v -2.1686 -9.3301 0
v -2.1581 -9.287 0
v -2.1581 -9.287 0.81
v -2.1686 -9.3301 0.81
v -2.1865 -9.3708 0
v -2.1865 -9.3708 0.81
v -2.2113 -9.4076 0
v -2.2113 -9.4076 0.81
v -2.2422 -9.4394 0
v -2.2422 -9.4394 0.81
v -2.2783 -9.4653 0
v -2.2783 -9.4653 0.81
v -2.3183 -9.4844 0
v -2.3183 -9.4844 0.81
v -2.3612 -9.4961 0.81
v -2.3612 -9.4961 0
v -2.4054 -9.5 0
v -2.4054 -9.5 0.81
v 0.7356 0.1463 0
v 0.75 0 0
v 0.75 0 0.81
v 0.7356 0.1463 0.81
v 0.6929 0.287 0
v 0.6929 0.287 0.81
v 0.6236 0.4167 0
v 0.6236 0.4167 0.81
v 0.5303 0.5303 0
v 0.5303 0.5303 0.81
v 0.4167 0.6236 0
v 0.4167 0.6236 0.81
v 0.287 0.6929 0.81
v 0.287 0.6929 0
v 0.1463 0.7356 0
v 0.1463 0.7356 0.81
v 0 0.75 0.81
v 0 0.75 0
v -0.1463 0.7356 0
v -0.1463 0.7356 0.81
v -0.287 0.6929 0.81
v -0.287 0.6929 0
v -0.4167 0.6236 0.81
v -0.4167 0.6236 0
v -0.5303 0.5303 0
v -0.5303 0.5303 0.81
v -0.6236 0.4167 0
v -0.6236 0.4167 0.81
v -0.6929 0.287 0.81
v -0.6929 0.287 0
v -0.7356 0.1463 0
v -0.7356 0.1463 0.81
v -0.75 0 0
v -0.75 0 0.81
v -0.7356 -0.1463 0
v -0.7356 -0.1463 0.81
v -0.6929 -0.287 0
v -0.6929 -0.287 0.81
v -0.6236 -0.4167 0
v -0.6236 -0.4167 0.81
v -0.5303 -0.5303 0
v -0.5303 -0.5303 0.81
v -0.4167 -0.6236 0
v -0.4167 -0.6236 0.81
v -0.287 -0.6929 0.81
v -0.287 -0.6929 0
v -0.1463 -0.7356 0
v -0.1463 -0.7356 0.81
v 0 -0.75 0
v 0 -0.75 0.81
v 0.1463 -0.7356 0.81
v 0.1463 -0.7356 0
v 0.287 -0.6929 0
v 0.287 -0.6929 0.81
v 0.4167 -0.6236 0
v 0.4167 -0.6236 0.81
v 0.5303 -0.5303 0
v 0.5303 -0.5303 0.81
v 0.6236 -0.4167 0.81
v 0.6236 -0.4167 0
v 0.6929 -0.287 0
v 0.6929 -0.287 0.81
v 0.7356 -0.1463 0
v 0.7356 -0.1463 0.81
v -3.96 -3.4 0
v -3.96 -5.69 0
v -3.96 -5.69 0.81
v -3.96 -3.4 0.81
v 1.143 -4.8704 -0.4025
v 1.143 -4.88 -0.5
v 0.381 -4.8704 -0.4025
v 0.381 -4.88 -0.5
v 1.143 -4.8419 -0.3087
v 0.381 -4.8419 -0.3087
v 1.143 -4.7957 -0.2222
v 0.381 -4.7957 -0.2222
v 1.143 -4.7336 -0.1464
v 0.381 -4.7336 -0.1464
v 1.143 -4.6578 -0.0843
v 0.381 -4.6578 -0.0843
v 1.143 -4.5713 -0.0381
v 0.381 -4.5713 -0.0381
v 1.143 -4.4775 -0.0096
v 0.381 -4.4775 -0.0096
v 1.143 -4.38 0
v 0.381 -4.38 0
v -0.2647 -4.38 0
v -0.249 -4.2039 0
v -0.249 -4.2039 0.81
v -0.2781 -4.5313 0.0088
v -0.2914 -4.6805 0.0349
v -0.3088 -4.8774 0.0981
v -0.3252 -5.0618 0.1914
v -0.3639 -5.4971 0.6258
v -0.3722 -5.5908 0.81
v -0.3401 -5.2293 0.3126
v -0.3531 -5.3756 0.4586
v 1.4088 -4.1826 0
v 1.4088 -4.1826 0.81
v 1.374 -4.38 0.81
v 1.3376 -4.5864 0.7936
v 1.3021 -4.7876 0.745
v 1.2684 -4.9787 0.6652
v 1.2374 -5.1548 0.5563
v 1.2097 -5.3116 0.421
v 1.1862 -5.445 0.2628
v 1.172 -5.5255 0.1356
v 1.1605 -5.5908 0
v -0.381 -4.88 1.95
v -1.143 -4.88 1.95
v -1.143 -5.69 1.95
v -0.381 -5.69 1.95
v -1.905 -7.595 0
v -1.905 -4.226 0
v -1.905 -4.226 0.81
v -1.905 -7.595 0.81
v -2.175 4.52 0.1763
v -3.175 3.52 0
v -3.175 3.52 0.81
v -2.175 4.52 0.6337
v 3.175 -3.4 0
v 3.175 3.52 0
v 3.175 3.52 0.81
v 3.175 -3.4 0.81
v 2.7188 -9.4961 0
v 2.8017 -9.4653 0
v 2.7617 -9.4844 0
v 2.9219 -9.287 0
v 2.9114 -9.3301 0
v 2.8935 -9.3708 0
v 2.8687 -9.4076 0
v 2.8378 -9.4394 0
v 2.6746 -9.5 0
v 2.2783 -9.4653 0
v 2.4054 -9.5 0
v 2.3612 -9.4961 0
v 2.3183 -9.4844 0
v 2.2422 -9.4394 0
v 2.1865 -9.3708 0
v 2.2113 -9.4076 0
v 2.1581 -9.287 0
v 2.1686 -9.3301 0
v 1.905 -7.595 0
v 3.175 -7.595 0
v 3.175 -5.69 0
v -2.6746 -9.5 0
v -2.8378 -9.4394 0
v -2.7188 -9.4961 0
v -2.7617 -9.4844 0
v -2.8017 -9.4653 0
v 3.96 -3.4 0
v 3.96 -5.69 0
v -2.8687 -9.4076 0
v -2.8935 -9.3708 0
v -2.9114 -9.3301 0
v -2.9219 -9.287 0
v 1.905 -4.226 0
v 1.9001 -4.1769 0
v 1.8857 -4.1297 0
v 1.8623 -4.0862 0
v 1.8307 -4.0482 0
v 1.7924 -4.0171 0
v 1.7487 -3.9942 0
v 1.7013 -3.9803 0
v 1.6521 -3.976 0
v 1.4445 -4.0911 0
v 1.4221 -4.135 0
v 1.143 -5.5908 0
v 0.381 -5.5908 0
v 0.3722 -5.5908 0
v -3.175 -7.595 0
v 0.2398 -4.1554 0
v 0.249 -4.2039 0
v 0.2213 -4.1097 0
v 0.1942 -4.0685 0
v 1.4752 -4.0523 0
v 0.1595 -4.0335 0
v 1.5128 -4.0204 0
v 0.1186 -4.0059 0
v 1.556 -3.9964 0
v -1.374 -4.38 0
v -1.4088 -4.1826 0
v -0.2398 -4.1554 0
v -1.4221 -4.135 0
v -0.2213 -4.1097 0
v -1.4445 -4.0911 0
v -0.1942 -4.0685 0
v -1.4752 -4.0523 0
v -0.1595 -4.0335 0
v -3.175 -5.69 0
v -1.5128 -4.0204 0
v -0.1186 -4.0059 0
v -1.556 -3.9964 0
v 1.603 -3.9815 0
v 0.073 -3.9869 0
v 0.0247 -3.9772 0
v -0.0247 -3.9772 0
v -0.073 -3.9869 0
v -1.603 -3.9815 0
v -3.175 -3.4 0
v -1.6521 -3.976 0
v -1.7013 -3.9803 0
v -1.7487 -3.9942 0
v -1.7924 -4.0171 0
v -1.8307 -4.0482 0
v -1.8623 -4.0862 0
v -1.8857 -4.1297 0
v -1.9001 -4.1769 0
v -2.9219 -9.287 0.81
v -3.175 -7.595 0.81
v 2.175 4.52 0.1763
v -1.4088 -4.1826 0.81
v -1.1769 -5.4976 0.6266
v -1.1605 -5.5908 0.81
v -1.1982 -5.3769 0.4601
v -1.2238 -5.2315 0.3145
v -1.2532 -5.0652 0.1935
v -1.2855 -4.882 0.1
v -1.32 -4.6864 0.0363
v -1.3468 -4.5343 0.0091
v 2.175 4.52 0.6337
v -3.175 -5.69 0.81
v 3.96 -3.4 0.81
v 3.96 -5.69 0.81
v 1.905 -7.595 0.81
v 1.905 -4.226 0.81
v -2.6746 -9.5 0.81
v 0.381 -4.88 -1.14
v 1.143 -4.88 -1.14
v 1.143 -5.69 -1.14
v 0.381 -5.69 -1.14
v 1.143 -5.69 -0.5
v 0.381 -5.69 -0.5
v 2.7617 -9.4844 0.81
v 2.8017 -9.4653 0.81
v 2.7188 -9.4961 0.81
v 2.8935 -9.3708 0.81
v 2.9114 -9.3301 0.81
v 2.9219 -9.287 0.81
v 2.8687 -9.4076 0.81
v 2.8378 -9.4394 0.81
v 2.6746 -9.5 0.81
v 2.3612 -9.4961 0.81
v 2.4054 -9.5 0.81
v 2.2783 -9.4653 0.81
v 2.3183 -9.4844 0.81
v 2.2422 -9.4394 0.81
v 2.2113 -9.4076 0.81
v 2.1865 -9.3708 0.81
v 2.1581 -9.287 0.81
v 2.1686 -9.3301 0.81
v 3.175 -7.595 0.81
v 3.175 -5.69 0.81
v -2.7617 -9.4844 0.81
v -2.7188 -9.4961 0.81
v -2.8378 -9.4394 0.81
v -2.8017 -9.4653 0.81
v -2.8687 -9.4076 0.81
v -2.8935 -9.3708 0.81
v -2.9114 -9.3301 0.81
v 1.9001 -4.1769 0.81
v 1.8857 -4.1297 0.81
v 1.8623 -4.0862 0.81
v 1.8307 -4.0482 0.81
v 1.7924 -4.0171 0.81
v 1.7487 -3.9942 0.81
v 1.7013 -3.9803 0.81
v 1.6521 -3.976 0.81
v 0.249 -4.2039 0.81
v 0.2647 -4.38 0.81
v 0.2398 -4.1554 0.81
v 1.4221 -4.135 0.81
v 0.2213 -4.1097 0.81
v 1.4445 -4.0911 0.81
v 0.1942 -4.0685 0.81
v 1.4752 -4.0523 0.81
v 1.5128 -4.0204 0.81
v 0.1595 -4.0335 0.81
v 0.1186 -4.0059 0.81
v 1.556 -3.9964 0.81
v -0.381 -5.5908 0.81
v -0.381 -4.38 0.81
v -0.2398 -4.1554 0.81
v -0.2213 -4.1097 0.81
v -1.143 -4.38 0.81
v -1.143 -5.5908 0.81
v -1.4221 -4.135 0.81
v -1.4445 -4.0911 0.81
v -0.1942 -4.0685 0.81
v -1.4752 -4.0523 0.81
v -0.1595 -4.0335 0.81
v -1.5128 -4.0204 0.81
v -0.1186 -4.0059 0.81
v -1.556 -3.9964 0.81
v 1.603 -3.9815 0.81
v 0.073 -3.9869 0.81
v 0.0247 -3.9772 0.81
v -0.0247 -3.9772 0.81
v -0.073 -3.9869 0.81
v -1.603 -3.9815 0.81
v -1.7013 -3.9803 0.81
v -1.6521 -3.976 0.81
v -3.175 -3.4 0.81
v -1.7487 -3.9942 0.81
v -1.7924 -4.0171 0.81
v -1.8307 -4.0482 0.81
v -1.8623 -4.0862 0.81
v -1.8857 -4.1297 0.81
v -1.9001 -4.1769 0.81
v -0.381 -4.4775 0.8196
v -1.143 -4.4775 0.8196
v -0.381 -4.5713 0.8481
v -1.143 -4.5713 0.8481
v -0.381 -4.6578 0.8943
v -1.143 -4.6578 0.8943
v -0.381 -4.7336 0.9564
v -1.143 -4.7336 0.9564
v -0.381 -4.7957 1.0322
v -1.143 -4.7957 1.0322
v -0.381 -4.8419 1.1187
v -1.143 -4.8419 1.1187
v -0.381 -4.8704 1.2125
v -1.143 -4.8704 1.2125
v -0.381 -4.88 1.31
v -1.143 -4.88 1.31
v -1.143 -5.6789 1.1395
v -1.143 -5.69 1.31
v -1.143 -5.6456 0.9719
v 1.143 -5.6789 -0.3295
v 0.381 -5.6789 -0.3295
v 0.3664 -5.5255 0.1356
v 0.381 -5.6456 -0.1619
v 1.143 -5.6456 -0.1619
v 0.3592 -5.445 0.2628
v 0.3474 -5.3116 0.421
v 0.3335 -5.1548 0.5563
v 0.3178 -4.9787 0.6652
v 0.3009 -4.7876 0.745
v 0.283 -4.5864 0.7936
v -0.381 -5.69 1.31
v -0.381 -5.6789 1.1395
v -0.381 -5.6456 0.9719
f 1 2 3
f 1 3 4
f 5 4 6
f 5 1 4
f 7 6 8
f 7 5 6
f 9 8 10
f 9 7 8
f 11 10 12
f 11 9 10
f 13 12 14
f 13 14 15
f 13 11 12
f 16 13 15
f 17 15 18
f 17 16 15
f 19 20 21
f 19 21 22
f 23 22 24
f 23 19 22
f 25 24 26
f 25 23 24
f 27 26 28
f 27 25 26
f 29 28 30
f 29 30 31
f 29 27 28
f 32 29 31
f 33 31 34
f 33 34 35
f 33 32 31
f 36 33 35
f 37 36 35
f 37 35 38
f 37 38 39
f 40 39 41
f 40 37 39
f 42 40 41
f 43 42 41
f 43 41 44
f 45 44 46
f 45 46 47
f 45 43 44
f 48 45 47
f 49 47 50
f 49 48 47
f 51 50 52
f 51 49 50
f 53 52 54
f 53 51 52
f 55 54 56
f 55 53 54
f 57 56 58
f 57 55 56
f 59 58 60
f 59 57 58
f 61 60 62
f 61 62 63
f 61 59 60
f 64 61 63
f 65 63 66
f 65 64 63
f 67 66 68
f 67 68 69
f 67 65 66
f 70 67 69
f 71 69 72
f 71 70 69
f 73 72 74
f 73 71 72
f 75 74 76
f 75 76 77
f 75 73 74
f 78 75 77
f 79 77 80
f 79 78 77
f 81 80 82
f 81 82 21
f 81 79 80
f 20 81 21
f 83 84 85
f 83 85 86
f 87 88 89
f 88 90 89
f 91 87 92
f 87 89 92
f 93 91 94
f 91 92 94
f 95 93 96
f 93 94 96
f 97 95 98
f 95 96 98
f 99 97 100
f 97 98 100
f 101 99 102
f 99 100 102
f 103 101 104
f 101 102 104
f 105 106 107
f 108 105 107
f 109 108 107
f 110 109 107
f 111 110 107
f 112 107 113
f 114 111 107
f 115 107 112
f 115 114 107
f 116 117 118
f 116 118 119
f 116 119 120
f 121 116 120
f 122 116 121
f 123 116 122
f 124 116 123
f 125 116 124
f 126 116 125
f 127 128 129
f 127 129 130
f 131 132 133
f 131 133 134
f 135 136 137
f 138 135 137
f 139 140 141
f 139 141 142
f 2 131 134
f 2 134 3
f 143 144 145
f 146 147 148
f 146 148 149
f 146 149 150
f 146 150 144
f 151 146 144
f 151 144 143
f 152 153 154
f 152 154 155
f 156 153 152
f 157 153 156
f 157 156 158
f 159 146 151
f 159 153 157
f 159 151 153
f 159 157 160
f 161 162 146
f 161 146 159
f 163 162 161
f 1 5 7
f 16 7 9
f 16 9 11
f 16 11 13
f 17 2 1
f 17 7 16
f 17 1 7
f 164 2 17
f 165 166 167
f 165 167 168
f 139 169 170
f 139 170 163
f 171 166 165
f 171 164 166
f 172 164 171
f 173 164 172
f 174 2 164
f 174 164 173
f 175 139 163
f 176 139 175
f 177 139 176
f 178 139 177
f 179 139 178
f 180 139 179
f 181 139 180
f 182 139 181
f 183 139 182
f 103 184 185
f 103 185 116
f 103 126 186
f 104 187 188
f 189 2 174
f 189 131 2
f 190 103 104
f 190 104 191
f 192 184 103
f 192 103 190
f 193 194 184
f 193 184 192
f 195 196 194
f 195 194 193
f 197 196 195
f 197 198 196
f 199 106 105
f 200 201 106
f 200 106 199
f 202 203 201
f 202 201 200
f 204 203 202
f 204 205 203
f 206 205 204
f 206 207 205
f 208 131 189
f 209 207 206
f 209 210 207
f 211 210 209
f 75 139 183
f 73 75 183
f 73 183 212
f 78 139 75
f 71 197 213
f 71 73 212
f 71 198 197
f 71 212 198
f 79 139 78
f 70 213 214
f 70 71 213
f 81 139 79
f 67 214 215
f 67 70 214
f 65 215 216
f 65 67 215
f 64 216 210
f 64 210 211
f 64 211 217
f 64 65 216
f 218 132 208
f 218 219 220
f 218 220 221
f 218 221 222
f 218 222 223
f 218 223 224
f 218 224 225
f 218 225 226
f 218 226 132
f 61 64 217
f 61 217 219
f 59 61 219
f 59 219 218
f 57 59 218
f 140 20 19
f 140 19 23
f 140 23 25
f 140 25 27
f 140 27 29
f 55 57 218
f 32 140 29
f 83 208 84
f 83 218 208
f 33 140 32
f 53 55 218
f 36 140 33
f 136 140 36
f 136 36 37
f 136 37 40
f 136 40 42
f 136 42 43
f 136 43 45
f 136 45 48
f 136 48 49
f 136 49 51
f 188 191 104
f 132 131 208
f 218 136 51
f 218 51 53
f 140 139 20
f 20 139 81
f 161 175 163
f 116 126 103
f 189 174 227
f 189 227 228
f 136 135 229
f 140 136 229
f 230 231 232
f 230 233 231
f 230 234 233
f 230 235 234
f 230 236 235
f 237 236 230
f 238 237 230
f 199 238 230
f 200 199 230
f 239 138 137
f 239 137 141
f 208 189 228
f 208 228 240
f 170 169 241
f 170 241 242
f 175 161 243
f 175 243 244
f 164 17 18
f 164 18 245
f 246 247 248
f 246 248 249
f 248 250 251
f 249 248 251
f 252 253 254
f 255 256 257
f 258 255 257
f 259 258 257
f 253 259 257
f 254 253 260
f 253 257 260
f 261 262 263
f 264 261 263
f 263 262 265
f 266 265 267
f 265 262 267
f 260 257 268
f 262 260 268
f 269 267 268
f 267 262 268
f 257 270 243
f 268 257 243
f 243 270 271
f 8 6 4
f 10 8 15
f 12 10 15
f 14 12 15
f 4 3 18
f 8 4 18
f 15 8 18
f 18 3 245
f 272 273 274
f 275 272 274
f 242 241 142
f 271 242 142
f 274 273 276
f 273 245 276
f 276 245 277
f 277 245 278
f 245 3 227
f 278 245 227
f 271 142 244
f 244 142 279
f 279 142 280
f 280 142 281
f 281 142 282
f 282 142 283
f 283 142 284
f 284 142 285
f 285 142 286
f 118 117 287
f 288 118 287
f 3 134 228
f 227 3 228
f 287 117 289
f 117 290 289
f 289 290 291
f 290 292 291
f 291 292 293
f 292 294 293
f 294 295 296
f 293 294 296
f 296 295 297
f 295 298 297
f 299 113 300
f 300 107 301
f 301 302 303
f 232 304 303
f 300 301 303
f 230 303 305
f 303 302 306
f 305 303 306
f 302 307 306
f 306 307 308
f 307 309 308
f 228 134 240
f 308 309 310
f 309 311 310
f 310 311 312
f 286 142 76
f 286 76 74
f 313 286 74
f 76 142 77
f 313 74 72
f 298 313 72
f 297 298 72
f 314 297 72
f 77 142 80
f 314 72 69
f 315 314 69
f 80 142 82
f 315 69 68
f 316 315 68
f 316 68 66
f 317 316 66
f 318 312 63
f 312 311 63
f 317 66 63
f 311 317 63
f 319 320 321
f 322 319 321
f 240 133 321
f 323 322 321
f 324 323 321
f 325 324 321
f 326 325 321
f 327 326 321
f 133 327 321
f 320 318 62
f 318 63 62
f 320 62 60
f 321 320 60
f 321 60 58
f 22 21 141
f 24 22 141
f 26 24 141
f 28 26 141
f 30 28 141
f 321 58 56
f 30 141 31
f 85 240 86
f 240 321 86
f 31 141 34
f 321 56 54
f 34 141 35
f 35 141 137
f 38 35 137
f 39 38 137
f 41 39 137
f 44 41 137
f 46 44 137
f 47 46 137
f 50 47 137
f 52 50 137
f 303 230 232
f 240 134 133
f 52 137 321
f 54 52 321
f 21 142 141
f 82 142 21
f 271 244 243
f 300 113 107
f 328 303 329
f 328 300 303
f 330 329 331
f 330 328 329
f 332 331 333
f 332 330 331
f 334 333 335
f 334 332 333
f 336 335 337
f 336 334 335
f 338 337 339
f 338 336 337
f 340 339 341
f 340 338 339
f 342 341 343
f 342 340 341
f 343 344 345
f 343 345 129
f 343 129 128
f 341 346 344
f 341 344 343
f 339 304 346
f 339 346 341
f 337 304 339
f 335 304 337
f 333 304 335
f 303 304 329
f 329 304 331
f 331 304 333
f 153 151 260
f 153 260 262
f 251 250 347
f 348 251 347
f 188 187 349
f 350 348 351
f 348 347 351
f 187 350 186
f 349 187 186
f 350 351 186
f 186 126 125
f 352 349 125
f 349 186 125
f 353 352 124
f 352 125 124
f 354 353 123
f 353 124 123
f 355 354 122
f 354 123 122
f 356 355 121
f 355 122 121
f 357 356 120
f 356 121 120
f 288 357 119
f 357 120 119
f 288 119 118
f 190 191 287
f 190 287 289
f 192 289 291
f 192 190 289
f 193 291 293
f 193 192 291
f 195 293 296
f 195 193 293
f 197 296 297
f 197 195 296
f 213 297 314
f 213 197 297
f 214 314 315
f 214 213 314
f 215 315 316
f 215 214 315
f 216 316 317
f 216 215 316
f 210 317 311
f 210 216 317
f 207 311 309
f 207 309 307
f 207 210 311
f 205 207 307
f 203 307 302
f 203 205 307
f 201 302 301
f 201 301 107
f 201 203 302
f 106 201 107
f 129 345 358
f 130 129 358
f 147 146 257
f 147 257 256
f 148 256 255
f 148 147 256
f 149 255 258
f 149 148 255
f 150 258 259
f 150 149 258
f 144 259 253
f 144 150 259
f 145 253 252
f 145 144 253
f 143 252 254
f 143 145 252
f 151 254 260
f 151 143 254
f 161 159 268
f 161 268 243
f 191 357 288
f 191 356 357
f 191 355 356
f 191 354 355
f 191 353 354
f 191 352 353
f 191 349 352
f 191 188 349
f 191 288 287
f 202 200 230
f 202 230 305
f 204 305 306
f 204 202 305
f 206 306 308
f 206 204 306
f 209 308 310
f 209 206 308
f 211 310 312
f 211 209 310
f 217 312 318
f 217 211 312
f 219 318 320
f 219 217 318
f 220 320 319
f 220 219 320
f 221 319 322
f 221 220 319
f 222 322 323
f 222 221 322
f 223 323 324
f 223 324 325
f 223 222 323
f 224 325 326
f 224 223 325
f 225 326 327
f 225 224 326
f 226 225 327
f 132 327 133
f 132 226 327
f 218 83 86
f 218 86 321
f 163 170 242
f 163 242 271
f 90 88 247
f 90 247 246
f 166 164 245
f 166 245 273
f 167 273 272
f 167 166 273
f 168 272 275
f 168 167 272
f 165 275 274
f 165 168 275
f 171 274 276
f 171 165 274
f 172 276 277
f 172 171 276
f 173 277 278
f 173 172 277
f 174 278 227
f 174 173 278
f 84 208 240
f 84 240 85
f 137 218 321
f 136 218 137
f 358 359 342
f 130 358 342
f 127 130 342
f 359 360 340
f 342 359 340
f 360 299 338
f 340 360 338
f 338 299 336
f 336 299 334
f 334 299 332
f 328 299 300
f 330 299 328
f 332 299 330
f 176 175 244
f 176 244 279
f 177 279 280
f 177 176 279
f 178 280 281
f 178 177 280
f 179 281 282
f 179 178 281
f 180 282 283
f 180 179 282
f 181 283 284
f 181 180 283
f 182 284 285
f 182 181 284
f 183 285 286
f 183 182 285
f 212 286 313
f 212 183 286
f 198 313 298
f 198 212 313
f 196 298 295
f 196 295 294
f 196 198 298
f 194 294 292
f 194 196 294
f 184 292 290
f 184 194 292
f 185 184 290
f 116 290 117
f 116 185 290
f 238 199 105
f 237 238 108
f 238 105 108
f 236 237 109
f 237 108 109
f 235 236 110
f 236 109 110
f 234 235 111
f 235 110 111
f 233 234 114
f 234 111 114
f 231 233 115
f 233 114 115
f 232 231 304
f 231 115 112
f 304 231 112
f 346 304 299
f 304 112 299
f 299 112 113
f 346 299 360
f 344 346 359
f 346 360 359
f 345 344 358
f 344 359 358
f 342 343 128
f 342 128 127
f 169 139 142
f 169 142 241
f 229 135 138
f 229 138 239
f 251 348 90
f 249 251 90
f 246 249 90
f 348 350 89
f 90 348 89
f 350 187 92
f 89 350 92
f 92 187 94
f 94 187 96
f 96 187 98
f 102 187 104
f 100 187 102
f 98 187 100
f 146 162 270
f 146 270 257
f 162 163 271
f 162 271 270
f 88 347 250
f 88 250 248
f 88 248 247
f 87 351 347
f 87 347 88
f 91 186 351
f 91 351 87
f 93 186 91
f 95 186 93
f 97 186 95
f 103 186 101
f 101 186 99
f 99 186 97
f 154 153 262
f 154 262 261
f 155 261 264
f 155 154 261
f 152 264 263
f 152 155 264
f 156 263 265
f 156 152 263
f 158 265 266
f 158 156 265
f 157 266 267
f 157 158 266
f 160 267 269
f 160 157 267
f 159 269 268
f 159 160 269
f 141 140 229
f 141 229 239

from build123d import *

# Parameters (mm, degrees)
SKETCH1_R      = 0.75
EXTRUDE1_DEPTH = 0.81
CHAMFER4_SIZE  = 1
CHAMFER4_SIZE2 = 0.176326981
CHAMFER5_SIZE  = 1
CHAMFER5_SIZE2 = 0.176326981
CHAMFER1_SIZE  = 1
SKETCH2_W      = 0.762
SKETCH2_H      = 0.81
EXTRUDE2_DEPTH = 1.14
SKETCH3_W      = 0.762
SKETCH3_H      = 0.81
EXTRUDE3_DEPTH = 1.14
FILLET1_R      = 0.5
FILLET2_R      = 1.31


with BuildPart() as part:
    # Sketch1 → Extrude1 (new body)
    with BuildSketch(Plane.XY):
        with BuildLine():
            Line((-3.175, 4.52), (3.175, 4.52))
            Line((3.175, 4.52), (3.175, -3.4))
            Line((3.175, -3.4), (3.96, -3.4))
            Line((3.96, -3.4), (3.96, -5.69))
            Line((3.96, -5.69), (3.175, -5.69))
            Line((3.175, -5.69), (3.175, -7.595))
            Line((3.175, -7.595), (2.921867651, -9.286989911))
            ThreePointArc((2.921867651, -9.286989911), (2.837794855, -9.43940364), (2.674619301, -9.5))
            Line((2.674619301, -9.5), (2.405380699, -9.5))
            ThreePointArc((2.405380699, -9.5), (2.242205145, -9.43940364), (2.158132349, -9.286989911))
            Line((2.158132349, -9.286989911), (1.905, -7.595))
            Line((1.905, -7.595), (1.905, -4.225996329))
            ThreePointArc((1.905, -4.225996329), (1.676788936, -3.976947655), (1.408798062, -4.182584285))
            Line((1.408798062, -4.182584285), (1.143, -5.69))
            Line((1.143, -5.69), (0.381, -5.69))
            Line((0.381, -5.69), (0.249019923, -4.203881227))
            ThreePointArc((0.249019923, -4.203881227), (0, -3.975996329), (-0.249019923, -4.203881227))
            Line((-0.249019923, -4.203881227), (-0.381, -5.69))
            Line((-0.381, -5.69), (-1.143, -5.69))
            Line((-1.143, -5.69), (-1.408798062, -4.182584285))
            ThreePointArc((-1.408798062, -4.182584285), (-1.676788936, -3.976947655), (-1.905, -4.225996329))
            Line((-1.905, -4.225996329), (-1.905, -7.595))
            Line((-1.905, -7.595), (-2.158132349, -9.286989911))
            ThreePointArc((-2.158132349, -9.286989911), (-2.242205145, -9.43940364), (-2.405380699, -9.5))
            Line((-2.405380699, -9.5), (-2.674619301, -9.5))
            ThreePointArc((-2.674619301, -9.5), (-2.837794855, -9.43940364), (-2.921867651, -9.286989911))
            Line((-2.921867651, -9.286989911), (-3.175, -7.595))
            Line((-3.175, -7.595), (-3.175, -5.69))
            Line((-3.175, -5.69), (-3.96, -5.69))
            Line((-3.96, -5.69), (-3.96, -3.4))
            Line((-3.96, -3.4), (-3.175, -3.4))
            Line((-3.175, -3.4), (-3.175, 4.52))
        make_face()
        Circle(SKETCH1_R, mode=Mode.SUBTRACT)
    extrude(amount=EXTRUDE1_DEPTH)

    # Chamfer4
    chamfer4_edges = [part.edges().sort_by_distance(p)[0] for p in [
        (0, 4.52, 0.81),
    ]]
    chamfer4_side = [part.faces().sort_by_distance(p)[0] for p in [
        (0, -1.422995991, 0.81),
    ]]
    chamfer(chamfer4_edges, length=CHAMFER4_SIZE, length2=CHAMFER4_SIZE2, reference=chamfer4_side[0])

    # Chamfer5
    chamfer5_edges = [part.edges().sort_by_distance(p)[0] for p in [
        (0, 4.52, 0),
    ]]
    chamfer5_side = [part.faces().sort_by_distance(p)[0] for p in [
        (0, -1.422995991, 0),
    ]]
    chamfer(chamfer5_edges, length=CHAMFER5_SIZE, length2=CHAMFER5_SIZE2, reference=chamfer5_side[0])

    # Chamfer1
    chamfer1_edges = [part.edges().sort_by_distance(p)[0] for p in [
        (-3.175, 4.52, 0.405),
        (3.175, 4.52, 0.405),
    ]]
    chamfer(chamfer1_edges, length=CHAMFER1_SIZE)

    # Sketch2 → Extrude2 (add)
    with BuildSketch(Plane.XY.offset(0.81)):
        with Locations((-0.762, -5.285)):
            Rectangle(SKETCH2_W, SKETCH2_H)
    extrude(amount=EXTRUDE2_DEPTH)

    # Sketch3 → Extrude3 (add)
    with BuildSketch(Plane(origin=(0, 0, 0), x_dir=(-1, 0, 0), z_dir=(0, 0, -1))):
        with Locations((-0.762, -5.285)):
            Rectangle(SKETCH3_W, SKETCH3_H)
    extrude(amount=EXTRUDE3_DEPTH)

    # Fillet1
    fillet1_edges = [part.edges().sort_by_distance(p)[0] for p in [
        (-0.762, -4.88, 0.81),
        (0.762, -4.88, 0),
    ]]
    fillet(fillet1_edges, radius=FILLET1_R)

    # Fillet2
    # the kernel refuses this fillet: 1.31 mm, written as the material it takes off along each edge
    with BuildSketch(Plane(origin=(2.894, -5.69, 0), x_dir=(0, 1, 0), z_dir=(-1, 0, 0))) as fillet2_piece_1_section:
        with BuildLine():
            CenterArc((FILLET2_R, -FILLET2_R), FILLET2_R, 90, 90)
            Line((0, -FILLET2_R), (0, 0))
            Line((0, 0), (FILLET2_R, 0))
        make_face()
    fillet2_piece_1 = extrude(amount=7.312, mode=Mode.PRIVATE)
    fillet2_piece_1 = split(fillet2_piece_1, bisect_by=Plane(origin=(-1.183630383, -5.45957365, 0.262964563), z_dir=(0.984807753012208, 0.17364817766693083, 0)), keep=Keep.TOP, mode=Mode.PRIVATE)
    fillet2_piece_1 = split(fillet2_piece_1, bisect_by=Plane(origin=(0.345201257, -5.286899882, 0.262964563), z_dir=(-0.9960796936325239, -0.08846040884450787, 0)), keep=Keep.TOP, mode=Mode.PRIVATE)
    add(fillet2_piece_1, mode=Mode.SUBTRACT)
    with BuildSketch(Plane(origin=(4.418, -5.69, 0.81), x_dir=(0, 1, 0), z_dir=(-1, 0, 0))) as fillet2_piece_2_section:
        with BuildLine():
            CenterArc((FILLET2_R, FILLET2_R), FILLET2_R, 180, 90)
            Line((0, FILLET2_R), (0, 0))
            Line((0, 0), (FILLET2_R, 0))
        make_face()
    fillet2_piece_2 = extrude(amount=7.312, mode=Mode.PRIVATE)
    fillet2_piece_2 = split(fillet2_piece_2, bisect_by=Plane(origin=(1.905, -5.189166234, 0.641921168), z_dir=(-1, 0, 0)), keep=Keep.TOP, mode=Mode.PRIVATE)
    fillet2_piece_2 = split(fillet2_piece_2, bisect_by=Plane(origin=(0.343178087, -5.264118635, 0.641921168), z_dir=(0.9960796936325239, 0.08846040884450787, 0)), keep=Keep.TOP, mode=Mode.PRIVATE)
    add(fillet2_piece_2, mode=Mode.SUBTRACT)


solid = part.part
